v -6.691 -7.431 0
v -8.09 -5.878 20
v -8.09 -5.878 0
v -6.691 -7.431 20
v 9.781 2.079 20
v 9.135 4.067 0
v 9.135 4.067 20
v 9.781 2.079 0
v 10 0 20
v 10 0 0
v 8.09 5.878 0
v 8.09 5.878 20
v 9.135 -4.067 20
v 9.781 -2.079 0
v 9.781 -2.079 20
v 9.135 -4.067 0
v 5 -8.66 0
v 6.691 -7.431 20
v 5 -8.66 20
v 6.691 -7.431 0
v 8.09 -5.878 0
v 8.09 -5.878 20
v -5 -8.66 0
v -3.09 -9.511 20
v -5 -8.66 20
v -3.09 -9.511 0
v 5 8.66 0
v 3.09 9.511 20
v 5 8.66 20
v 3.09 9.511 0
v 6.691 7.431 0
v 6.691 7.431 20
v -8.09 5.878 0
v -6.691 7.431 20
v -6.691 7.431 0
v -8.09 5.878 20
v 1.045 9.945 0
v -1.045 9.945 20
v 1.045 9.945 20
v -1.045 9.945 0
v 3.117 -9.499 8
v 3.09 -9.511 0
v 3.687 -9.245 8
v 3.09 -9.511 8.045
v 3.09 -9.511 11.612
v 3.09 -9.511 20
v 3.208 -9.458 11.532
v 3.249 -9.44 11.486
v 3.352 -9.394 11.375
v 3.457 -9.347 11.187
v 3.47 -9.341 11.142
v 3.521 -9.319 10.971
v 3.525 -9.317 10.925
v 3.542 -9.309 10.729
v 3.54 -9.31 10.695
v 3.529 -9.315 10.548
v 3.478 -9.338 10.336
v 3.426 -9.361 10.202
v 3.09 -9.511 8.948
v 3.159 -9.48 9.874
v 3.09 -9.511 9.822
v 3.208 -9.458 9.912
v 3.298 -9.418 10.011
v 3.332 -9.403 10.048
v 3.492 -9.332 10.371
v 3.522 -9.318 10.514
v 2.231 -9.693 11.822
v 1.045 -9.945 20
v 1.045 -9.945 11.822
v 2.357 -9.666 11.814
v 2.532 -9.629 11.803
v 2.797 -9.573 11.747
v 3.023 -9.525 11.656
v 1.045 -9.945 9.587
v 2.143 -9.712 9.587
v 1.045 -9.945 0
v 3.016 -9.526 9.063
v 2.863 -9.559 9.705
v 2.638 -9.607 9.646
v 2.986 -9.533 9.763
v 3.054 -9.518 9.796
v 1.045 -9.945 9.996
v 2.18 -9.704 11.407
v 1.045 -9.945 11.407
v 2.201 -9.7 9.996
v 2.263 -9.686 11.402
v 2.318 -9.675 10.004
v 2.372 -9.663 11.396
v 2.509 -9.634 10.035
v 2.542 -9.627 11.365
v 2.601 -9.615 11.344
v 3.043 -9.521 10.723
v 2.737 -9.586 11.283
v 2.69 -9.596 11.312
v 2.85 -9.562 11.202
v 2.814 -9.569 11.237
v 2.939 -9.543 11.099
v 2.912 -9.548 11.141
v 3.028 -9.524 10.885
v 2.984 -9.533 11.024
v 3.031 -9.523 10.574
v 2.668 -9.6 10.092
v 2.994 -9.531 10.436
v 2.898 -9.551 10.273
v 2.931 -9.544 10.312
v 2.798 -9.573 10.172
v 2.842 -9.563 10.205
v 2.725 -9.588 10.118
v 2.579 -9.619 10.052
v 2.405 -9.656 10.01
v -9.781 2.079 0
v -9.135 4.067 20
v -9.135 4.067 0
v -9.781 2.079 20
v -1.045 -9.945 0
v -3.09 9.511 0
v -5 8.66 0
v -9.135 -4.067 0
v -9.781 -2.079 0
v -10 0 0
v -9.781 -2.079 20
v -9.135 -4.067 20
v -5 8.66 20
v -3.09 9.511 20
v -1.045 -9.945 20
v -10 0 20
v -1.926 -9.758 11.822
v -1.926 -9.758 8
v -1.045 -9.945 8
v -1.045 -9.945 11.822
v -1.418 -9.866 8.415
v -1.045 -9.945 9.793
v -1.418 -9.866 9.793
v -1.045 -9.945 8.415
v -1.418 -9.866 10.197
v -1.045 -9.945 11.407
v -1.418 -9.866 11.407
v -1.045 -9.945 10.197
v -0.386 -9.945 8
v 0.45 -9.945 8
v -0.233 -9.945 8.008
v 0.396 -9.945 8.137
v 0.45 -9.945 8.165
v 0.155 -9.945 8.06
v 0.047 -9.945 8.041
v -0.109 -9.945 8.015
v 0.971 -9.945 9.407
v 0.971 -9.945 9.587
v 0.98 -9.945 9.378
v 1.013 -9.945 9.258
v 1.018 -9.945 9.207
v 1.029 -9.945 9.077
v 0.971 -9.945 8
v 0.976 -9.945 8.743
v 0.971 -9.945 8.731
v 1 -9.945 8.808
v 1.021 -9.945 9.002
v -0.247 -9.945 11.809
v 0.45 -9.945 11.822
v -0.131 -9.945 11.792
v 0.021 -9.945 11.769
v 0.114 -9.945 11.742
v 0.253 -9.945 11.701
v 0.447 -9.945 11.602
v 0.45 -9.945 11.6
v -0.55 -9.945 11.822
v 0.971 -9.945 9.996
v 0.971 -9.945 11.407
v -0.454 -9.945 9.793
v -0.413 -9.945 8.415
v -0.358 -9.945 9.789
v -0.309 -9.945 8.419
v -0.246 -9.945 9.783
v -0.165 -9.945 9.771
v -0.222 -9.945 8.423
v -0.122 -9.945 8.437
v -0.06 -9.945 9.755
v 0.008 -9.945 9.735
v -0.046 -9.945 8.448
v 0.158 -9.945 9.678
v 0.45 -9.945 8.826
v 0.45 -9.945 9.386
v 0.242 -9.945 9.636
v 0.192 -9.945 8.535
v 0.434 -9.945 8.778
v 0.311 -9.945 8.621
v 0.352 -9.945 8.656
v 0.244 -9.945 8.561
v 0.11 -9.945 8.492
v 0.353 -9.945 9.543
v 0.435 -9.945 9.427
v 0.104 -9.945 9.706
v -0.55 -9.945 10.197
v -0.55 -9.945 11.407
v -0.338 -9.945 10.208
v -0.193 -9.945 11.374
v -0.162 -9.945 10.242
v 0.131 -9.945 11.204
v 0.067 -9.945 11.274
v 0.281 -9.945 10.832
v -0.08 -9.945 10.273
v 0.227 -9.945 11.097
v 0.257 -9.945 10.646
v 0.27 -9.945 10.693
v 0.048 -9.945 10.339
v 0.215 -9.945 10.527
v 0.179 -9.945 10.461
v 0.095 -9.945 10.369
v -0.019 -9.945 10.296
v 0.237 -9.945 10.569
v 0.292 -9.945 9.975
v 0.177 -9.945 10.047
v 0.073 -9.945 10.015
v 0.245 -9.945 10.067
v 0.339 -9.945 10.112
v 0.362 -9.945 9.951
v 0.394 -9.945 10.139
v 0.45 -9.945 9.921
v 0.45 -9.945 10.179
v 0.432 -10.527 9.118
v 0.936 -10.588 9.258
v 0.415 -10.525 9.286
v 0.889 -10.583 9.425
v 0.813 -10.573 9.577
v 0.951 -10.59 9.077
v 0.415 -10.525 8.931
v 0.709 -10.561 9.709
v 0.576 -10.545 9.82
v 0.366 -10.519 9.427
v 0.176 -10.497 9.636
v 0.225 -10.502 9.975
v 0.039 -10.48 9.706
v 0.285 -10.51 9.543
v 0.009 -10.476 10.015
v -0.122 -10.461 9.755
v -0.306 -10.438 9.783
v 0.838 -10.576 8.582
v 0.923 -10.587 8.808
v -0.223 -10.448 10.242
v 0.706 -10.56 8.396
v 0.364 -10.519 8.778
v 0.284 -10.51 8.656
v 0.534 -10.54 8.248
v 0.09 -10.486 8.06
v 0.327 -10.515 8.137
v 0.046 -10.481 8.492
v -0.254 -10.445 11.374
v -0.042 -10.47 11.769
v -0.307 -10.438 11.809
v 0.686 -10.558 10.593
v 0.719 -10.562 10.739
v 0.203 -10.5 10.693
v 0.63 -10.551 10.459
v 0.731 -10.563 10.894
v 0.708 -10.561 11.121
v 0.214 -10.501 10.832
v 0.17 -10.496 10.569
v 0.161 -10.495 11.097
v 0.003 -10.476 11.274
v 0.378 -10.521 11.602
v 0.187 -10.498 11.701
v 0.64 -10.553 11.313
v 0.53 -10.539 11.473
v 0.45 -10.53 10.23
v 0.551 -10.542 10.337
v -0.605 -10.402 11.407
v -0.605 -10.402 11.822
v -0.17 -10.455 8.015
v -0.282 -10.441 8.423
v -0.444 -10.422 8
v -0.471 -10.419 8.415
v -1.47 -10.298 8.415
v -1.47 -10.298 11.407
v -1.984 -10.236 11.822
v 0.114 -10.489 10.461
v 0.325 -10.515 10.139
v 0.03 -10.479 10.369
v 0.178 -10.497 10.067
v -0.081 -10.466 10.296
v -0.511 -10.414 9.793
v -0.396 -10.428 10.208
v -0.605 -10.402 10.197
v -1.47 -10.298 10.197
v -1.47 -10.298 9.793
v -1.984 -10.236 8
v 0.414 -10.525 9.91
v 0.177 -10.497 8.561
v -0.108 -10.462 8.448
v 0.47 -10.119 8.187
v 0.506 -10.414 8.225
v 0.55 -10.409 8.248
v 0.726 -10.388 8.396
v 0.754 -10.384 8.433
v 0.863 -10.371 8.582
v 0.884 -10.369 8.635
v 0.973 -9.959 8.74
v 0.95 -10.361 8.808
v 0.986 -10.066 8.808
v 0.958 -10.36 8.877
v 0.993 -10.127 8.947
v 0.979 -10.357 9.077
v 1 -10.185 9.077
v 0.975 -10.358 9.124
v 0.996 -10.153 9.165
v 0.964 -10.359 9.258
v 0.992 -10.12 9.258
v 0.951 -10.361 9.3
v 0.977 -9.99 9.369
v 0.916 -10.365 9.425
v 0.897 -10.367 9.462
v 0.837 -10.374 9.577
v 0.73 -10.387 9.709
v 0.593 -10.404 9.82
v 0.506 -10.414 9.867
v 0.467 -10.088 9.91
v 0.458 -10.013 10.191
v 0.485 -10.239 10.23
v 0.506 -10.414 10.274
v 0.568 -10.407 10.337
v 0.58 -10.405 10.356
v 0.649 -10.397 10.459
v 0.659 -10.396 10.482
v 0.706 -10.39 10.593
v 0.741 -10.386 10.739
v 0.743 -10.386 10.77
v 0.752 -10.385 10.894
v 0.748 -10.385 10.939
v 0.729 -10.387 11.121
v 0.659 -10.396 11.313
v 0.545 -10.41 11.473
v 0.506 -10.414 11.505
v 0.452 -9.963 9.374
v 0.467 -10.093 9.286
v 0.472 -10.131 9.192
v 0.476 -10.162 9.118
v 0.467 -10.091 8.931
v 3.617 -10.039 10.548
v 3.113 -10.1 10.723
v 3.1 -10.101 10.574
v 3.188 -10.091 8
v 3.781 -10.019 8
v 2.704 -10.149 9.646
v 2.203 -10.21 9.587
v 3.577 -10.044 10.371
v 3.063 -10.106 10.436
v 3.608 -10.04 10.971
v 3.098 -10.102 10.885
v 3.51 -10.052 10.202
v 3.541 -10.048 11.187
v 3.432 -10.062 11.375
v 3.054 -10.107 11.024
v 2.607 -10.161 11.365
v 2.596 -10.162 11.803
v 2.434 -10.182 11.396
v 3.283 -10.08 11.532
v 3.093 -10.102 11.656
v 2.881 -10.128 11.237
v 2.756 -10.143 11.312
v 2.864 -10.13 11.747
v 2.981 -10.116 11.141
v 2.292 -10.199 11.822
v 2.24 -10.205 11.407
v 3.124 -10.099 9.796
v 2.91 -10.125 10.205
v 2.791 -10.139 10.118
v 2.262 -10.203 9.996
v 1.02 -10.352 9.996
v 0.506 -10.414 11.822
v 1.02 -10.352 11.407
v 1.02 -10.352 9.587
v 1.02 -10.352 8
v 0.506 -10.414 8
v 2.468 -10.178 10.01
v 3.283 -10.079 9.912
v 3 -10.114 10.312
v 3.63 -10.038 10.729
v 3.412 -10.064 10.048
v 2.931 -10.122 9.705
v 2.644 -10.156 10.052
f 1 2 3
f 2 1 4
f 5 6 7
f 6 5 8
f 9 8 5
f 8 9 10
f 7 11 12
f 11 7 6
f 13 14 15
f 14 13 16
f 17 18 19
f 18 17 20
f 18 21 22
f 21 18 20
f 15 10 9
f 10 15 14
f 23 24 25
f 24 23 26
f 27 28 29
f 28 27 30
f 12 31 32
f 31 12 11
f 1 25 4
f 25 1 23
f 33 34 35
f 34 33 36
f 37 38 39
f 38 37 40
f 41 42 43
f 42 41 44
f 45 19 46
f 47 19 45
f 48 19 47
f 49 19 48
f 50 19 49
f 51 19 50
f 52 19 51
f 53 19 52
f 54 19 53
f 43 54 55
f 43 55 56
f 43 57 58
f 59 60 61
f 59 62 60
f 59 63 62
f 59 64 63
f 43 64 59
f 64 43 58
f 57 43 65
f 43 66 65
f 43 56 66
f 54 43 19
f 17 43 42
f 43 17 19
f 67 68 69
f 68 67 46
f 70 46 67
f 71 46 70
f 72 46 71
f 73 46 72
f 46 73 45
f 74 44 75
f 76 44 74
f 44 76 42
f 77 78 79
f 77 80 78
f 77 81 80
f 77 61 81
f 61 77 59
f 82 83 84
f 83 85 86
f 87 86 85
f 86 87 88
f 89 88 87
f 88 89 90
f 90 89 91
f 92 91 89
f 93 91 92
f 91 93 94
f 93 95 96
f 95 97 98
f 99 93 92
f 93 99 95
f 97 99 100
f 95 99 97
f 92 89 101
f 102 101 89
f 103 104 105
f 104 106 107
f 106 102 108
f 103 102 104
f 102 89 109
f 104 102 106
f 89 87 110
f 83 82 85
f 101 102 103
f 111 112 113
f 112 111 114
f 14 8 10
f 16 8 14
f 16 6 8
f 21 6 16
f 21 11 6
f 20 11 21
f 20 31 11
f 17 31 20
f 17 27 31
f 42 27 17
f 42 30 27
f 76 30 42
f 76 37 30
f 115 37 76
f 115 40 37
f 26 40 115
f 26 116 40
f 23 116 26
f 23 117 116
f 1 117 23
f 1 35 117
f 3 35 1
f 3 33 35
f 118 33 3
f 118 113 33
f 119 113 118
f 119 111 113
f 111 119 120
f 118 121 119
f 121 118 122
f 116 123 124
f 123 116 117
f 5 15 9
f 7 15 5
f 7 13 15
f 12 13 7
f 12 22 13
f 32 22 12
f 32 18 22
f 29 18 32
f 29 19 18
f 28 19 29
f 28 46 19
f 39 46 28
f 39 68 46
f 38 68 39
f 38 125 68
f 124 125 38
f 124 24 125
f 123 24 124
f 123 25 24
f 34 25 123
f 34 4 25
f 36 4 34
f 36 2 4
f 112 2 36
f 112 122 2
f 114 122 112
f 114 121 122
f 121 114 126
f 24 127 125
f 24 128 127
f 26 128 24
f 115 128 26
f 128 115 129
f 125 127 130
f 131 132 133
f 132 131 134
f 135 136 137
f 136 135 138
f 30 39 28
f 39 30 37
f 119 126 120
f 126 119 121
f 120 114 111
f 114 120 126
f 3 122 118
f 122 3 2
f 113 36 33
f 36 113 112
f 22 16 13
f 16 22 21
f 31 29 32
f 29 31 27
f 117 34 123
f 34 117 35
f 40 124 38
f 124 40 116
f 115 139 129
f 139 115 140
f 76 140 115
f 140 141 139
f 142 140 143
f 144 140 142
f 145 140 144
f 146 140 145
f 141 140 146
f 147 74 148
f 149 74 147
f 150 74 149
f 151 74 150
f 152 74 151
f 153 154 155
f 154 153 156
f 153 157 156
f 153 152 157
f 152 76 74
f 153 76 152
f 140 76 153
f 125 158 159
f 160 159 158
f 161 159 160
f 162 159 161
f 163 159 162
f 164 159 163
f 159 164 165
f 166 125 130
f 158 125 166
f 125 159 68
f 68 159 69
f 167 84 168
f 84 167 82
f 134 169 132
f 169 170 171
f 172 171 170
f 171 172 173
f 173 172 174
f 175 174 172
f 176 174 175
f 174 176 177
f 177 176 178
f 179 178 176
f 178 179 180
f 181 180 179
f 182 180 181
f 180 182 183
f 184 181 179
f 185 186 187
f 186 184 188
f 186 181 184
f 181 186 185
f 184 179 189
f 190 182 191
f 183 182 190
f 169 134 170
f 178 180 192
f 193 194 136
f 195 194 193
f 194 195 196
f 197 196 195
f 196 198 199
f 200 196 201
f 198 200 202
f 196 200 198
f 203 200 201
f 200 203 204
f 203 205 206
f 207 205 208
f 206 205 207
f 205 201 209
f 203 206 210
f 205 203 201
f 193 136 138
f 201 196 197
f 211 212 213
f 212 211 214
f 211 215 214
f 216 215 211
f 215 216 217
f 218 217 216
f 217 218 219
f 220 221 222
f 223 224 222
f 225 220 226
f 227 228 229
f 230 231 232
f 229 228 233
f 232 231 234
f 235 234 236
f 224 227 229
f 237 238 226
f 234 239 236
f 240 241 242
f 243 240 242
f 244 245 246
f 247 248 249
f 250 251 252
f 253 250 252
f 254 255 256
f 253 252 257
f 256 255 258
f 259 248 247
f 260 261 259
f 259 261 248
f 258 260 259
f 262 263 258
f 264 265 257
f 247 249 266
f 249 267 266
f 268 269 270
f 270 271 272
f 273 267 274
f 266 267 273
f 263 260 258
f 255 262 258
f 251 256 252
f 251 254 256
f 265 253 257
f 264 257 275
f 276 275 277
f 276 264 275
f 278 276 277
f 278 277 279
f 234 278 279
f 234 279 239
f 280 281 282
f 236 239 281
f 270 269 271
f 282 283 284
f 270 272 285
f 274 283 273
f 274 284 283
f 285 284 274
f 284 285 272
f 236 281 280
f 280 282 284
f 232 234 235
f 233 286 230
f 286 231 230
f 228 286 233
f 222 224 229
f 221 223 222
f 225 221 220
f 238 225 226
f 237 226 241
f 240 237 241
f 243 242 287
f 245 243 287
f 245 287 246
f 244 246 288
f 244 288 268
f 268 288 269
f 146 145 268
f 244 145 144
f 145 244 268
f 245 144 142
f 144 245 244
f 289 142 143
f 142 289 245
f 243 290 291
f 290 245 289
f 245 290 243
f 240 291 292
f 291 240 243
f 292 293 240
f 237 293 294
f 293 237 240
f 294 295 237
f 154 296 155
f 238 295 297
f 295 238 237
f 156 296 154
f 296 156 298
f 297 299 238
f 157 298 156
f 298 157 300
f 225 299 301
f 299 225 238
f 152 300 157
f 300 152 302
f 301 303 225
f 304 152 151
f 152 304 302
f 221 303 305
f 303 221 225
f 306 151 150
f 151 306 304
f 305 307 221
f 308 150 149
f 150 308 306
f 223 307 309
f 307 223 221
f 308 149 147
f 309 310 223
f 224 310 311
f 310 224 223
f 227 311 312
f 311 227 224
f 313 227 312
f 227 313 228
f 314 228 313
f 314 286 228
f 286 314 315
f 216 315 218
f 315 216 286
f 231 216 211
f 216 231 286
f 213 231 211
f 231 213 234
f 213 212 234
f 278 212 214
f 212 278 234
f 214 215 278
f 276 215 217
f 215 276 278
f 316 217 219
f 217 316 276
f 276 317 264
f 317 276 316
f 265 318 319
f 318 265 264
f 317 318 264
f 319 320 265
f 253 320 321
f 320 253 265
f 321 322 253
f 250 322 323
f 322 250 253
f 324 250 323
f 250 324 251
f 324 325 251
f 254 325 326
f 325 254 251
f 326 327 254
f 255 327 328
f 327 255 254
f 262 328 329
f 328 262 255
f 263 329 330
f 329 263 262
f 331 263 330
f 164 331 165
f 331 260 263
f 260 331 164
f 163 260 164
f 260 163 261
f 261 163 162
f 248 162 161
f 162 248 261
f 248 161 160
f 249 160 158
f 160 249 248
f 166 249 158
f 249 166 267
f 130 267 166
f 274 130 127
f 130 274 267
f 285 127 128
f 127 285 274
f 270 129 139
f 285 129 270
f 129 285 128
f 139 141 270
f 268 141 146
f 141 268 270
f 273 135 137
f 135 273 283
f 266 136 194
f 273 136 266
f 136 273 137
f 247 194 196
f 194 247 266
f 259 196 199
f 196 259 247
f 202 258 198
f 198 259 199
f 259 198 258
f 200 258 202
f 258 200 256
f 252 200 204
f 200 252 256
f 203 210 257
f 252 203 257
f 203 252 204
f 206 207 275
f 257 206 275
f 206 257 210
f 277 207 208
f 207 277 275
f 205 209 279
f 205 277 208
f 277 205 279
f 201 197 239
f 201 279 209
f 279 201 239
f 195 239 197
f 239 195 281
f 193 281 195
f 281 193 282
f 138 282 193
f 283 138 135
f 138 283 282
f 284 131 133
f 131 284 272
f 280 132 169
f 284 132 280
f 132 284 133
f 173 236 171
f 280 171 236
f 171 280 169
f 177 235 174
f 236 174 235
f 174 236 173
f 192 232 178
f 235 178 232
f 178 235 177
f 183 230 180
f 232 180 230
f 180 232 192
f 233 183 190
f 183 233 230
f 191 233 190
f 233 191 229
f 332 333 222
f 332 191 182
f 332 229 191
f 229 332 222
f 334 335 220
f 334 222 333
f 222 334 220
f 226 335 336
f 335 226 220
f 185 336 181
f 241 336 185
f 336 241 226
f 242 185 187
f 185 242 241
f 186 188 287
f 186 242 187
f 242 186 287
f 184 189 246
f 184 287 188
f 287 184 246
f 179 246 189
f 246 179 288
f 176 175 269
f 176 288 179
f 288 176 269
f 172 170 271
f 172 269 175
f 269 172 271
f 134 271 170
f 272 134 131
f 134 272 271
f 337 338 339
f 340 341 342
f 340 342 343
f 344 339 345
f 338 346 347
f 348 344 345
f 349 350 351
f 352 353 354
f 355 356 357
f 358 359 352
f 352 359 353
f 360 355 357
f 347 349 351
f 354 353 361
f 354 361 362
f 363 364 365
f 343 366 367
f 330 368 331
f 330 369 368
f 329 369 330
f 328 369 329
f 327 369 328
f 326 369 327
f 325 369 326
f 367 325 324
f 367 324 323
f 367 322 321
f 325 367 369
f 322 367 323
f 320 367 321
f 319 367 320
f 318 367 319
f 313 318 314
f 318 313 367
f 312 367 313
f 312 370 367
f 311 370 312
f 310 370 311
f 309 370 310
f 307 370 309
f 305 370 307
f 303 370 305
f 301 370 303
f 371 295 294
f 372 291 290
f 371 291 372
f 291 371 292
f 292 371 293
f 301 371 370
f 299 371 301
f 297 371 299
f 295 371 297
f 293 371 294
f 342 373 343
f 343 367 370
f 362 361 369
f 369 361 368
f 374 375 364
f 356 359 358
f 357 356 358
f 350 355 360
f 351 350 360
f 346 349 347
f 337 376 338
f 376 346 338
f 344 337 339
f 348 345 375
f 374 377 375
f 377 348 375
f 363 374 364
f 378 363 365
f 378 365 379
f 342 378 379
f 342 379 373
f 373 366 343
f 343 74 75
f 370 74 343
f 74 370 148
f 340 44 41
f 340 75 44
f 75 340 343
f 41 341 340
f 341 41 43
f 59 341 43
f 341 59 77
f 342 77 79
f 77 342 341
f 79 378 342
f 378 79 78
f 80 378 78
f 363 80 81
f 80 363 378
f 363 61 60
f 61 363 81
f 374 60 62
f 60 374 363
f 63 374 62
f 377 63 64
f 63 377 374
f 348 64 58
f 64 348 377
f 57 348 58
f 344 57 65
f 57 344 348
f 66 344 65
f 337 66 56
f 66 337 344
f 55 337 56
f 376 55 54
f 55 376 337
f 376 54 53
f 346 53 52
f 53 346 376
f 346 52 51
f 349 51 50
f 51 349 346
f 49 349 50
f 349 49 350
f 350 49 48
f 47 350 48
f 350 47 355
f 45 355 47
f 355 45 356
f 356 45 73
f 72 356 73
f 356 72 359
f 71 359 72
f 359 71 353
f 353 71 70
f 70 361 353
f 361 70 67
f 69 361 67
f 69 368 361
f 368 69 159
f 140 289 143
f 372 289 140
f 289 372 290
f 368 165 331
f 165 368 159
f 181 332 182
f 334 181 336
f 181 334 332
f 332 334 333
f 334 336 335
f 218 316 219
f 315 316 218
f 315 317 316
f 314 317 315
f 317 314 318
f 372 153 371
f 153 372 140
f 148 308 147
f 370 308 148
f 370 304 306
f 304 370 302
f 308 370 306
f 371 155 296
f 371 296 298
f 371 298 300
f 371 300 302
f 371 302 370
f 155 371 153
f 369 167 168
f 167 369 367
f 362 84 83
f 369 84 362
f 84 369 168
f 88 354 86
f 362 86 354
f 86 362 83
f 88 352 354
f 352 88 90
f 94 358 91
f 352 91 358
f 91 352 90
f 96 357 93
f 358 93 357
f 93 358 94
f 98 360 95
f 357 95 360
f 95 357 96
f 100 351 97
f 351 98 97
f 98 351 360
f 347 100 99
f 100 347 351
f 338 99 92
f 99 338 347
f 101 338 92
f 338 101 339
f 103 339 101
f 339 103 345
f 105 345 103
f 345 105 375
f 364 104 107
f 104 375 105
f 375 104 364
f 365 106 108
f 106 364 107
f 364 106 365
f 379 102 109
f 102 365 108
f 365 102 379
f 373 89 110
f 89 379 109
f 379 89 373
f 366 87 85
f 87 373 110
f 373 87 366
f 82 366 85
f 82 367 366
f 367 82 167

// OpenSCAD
// Generated by scadwright. Do not hand-edit —
// edit the Python source and regenerate.

union() {
    cylinder(h=20, r=10, center=false);

    translate([-1.13727, -9.43168, 10]) {
        multmatrix([[0.992809, 0, -0.119712, 0], [-0.119712, 0, -0.992809, 0], [0, 1, 0, 0], [0, 0, 0, 1]]) {
            linear_extrude(height=0.9, center=false) {
                translate([-1.2, -2, 0]) {
                    text("B", size=4);
                }
            }
        }
    }

    translate([1.13727, -9.43168, 10]) {
        multmatrix([[0.992809, 0, 0.119712, 0], [0.119712, 0, -0.992809, 0], [0, 1, 0, 0], [0, 0, 0, 1]]) {
            linear_extrude(height=0.9, center=false) {
                translate([-1.2, -2, 0]) {
                    text("R", size=4);
                }
            }
        }
    }
}
